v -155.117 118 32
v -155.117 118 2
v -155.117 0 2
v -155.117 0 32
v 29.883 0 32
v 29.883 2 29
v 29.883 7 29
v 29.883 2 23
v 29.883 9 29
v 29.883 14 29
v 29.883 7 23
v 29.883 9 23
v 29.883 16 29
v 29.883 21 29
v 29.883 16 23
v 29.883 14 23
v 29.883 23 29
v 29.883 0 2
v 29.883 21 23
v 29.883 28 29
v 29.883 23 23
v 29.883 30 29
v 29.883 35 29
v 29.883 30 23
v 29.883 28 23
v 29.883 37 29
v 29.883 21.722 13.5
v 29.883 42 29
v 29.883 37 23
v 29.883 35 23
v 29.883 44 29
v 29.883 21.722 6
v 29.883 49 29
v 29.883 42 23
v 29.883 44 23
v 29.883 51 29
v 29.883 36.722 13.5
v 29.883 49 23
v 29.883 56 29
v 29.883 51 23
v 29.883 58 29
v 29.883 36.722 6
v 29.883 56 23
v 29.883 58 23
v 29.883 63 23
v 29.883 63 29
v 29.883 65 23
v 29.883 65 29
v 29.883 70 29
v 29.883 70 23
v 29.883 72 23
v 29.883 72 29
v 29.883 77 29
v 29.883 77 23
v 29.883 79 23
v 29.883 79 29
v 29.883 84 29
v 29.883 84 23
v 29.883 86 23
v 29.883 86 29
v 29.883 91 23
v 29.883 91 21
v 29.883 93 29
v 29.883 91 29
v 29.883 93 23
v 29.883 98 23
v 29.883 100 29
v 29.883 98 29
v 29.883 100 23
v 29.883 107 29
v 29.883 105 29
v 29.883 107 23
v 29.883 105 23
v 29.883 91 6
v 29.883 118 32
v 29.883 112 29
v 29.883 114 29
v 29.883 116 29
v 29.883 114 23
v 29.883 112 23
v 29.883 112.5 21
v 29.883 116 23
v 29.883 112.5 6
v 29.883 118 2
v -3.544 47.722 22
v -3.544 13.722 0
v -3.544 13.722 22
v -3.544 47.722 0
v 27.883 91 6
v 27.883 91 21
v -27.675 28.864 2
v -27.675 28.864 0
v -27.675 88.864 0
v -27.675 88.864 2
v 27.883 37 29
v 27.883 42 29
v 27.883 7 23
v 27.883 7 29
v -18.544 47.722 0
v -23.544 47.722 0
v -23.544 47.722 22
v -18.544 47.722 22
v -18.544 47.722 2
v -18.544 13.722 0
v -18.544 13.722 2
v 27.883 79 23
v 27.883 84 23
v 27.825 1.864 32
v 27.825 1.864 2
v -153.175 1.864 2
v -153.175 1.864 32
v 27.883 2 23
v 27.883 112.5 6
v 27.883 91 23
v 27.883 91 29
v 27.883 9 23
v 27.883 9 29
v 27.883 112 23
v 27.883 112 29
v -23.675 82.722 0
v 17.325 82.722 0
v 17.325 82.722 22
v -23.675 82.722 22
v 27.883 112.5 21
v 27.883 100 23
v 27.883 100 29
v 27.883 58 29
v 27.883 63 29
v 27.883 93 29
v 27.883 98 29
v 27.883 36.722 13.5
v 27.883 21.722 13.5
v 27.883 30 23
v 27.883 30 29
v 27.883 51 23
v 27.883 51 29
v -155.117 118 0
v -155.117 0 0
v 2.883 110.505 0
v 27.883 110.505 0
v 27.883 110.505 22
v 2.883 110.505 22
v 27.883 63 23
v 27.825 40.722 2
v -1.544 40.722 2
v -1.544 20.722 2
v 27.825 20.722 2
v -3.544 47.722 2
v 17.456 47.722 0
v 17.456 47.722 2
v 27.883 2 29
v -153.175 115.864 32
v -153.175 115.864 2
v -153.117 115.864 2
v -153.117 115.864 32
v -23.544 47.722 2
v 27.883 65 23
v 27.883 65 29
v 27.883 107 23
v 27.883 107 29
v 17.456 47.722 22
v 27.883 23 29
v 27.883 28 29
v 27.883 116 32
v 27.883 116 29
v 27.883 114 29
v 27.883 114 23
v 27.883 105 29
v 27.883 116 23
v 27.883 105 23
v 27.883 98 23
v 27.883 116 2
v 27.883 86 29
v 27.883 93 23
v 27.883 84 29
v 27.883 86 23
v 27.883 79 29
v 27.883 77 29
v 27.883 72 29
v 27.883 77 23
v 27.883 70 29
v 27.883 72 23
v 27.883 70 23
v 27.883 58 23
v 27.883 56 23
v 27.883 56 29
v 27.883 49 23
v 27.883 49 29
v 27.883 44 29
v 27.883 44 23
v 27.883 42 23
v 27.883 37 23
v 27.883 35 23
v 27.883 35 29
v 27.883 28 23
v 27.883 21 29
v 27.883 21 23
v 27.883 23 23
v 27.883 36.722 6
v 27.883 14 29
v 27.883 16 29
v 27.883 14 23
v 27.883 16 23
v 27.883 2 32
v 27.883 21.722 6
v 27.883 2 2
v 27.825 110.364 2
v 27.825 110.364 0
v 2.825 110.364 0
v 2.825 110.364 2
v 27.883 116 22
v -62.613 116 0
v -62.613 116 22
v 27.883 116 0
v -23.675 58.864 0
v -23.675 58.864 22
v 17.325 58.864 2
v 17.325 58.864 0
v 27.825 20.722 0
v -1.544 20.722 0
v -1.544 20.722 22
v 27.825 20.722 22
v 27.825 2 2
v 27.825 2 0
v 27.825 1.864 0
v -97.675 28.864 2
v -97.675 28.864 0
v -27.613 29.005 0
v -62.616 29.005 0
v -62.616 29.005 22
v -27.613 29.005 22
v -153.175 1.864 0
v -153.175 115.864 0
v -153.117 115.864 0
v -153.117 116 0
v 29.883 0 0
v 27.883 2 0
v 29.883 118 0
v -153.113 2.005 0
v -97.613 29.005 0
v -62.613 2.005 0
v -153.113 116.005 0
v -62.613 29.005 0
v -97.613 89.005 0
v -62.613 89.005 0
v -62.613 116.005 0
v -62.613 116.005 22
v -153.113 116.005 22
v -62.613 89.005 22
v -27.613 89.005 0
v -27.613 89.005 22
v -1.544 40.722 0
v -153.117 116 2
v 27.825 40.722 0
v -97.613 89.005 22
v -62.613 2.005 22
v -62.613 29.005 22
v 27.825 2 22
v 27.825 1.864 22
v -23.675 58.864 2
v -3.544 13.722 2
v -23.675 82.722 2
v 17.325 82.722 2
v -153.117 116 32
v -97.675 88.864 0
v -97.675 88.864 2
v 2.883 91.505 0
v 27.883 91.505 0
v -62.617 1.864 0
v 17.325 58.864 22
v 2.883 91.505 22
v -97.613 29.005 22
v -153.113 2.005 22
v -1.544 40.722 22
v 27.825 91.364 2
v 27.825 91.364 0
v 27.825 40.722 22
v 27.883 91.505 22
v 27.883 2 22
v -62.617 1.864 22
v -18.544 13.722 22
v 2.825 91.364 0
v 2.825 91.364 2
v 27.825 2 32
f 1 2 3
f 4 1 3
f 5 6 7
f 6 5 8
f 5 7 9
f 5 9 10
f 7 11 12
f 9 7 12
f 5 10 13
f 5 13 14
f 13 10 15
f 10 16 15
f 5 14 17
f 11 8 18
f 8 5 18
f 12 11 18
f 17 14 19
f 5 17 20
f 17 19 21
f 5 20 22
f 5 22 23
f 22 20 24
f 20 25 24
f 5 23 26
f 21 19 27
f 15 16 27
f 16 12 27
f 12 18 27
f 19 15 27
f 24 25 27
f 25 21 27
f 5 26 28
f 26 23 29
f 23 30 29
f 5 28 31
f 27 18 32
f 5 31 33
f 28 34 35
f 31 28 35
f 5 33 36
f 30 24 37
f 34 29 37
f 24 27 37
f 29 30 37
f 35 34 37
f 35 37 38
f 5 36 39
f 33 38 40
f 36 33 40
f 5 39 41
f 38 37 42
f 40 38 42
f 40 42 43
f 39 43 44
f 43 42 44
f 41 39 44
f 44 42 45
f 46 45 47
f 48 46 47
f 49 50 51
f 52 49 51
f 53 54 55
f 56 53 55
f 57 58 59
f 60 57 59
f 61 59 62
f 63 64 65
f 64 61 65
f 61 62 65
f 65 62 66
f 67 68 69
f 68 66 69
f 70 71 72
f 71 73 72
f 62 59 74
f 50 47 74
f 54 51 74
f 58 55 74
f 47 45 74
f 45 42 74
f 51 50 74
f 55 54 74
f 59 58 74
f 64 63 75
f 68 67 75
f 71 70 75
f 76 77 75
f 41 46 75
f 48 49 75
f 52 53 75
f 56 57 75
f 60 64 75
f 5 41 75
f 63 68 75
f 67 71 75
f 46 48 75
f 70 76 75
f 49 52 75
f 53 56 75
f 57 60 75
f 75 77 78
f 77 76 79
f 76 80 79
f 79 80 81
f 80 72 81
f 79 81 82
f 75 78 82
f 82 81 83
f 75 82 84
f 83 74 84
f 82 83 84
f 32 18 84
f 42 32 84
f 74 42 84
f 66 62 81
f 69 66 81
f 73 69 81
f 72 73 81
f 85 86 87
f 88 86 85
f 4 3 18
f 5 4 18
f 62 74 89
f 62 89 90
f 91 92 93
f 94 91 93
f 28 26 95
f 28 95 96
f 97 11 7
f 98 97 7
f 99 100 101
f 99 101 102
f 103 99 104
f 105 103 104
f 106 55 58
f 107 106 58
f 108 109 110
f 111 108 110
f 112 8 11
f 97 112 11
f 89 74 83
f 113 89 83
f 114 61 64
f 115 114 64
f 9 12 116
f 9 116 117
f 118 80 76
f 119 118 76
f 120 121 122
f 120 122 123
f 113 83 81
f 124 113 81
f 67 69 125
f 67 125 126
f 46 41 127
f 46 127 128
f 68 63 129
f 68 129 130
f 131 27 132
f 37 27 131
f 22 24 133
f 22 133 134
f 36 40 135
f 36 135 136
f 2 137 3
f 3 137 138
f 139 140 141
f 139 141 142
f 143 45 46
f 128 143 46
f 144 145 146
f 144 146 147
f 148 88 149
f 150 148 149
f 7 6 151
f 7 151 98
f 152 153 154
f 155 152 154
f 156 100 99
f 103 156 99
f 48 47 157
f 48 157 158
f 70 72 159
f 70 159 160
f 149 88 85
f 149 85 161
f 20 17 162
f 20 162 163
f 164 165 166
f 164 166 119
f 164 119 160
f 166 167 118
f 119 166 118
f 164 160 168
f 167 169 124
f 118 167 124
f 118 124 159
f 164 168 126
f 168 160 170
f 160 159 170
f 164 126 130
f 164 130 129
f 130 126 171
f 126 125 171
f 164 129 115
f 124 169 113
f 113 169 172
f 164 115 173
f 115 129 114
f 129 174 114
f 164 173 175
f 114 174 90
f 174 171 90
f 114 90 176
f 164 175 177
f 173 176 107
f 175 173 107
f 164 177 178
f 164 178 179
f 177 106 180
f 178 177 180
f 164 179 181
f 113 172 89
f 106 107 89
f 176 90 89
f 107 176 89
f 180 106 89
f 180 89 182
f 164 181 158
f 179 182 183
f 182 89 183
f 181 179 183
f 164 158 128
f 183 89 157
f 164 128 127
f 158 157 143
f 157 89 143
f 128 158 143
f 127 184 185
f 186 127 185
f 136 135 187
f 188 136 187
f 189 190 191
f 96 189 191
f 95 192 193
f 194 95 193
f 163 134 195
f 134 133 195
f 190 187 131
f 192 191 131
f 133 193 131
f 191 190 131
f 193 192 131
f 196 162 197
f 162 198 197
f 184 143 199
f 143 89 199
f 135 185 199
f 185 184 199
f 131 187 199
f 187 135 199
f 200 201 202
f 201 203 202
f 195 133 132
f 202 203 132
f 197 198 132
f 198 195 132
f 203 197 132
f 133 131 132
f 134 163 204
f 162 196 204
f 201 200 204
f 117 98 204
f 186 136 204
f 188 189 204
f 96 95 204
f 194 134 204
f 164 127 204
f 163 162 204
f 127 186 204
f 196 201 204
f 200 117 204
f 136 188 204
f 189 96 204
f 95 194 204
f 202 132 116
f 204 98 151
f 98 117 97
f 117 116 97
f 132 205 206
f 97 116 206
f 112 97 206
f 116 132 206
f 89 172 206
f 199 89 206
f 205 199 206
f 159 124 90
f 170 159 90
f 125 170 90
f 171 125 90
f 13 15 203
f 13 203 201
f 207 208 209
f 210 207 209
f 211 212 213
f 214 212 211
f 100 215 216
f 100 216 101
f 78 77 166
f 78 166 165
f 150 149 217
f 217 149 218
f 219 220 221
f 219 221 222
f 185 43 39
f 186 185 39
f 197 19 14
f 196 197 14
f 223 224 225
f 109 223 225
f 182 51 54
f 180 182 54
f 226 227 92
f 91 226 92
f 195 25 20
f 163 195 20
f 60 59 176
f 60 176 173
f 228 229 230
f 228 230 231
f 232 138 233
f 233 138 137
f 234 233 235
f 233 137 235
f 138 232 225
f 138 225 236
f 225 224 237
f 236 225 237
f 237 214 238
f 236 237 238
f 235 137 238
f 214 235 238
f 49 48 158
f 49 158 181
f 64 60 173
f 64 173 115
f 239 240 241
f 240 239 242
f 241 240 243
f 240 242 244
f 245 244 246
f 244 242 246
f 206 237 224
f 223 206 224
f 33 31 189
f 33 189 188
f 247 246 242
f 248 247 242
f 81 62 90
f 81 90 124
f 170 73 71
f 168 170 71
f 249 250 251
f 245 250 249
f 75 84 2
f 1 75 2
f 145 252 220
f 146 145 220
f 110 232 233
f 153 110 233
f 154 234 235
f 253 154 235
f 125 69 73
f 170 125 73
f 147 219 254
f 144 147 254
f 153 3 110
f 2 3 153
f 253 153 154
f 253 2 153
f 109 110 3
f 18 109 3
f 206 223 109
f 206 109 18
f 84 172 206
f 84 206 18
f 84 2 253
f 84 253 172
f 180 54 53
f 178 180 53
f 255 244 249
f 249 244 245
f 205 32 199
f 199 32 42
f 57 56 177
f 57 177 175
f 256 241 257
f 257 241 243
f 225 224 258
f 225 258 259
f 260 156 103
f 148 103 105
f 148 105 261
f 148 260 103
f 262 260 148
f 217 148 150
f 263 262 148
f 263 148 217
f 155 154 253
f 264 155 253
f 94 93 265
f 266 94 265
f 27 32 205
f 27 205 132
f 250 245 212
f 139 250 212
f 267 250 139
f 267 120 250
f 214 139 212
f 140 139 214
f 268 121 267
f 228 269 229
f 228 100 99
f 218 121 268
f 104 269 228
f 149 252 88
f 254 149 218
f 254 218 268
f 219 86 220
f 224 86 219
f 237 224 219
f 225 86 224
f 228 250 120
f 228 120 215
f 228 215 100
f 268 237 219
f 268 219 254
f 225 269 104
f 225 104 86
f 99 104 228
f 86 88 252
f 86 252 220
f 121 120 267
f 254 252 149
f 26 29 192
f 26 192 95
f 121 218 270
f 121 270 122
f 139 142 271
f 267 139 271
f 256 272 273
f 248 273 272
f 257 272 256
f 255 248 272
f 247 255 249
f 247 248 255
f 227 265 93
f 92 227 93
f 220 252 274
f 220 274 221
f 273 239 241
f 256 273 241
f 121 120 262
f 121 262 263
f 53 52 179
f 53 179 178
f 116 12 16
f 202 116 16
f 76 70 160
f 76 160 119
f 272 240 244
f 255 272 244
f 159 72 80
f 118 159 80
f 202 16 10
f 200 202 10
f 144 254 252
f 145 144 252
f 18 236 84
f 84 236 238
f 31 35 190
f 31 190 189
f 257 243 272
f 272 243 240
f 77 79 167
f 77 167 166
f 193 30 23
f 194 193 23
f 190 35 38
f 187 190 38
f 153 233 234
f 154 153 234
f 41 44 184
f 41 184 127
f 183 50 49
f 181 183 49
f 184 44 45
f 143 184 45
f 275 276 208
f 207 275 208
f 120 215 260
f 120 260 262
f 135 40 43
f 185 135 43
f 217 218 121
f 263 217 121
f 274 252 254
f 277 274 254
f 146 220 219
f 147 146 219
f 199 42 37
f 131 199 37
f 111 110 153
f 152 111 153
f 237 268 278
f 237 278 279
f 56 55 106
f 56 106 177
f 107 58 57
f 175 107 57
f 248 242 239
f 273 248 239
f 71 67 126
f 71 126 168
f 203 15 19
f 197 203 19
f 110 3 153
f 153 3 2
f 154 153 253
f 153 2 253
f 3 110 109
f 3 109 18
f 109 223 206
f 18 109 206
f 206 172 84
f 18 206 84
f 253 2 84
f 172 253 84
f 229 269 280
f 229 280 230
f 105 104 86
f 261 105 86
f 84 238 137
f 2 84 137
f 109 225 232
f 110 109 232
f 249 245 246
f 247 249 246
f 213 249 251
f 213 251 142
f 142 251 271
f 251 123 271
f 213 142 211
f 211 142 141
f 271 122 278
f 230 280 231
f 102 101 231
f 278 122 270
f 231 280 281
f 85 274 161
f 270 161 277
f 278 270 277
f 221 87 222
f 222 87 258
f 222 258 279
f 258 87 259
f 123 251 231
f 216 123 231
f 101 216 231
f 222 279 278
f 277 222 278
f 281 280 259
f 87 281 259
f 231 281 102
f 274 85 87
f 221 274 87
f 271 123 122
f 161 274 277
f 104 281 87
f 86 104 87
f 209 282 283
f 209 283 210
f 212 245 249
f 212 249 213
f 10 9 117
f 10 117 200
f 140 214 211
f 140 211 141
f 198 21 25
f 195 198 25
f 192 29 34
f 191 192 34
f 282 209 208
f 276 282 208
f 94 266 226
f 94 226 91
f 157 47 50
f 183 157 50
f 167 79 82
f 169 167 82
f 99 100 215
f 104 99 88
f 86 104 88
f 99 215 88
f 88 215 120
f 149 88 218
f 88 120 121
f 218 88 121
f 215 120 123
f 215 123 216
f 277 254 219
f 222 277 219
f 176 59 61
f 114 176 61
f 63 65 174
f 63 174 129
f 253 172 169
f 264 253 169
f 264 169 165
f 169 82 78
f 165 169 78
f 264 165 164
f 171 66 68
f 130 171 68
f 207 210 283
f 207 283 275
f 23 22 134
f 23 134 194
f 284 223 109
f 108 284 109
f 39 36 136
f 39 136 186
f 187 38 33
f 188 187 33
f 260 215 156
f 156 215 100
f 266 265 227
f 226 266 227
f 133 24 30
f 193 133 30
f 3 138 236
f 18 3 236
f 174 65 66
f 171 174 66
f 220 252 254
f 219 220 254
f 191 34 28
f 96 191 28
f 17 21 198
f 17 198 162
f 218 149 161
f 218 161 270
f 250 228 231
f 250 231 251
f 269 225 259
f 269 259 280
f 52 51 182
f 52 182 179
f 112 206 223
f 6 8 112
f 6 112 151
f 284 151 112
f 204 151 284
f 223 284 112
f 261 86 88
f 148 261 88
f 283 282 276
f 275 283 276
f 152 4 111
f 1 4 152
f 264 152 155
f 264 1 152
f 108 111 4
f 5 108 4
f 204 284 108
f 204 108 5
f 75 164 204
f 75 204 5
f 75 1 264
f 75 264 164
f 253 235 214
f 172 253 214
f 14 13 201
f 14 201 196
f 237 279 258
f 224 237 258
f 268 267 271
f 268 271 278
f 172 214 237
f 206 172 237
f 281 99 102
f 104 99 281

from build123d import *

# Parameters (mm, degrees)
F1_DEPTH = 2
F0_W     = 41
F0_H     = 23.8580039246
F0_W_2   = 35
F0_H_2   = 30
F0_W_3   = 14.5
F0_H_3   = 19
F0_W_4   = 10.5
F3_DEPTH = 22
F4_DEPTH = 30
F5_W     = 29.3693448901
F5_H     = 20
F6_DEPTH = 22
F7_W     = 5
F7_H     = 6
F7_W_2   = 2
F7_W_3   = 15
F7_H_2   = 7.5
F7_W_4   = 21.5
F7_H_3   = 15
F8_DEPTH = 2


with BuildPart() as f1:
    # F0 (on Top) → F1 (new body)
    with BuildSketch(Plane.XY):
        Polygon((29.8828537283, 118), (-155.1171462717, 118), (-155.1171462717, 0), (29.8828537283, 0), (29.8828537283, 47.8673752217), align=None)
        Polygon((27.8828537283, 108.5818558931), (27.8828537283, 47.8439224922), (27.8828537283, 9.4181441069), (27.8828537283, 2), (27.8251939824, 2), (27.8251939824, 1.8636477081), (-62.6748060176, 1.8636477081), (-153.1748060176, 1.8636477081), (-153.1748060176, 58.8636477081), (-153.1748060176, 115.8636477081), (-153.1171462717, 115.8636477081), (-153.1171462717, 116), (27.8828537283, 116), align=None, mode=Mode.SUBTRACT)
    extrude(amount=F1_DEPTH)


with BuildPart() as f1b:
    # F0 (on Top) → F1, piece 2 (new body)
    with BuildSketch(Plane.XY):
        Polygon((27.8251939824, 20.7216516327), (27.8251939824, 40.7216516327), (-1.5441509077, 40.7216516327), (-1.5441509077, 30.7216516327), (-1.5441509077, 20.7216516327), align=None)
    extrude(amount=F1_DEPTH)


with BuildPart() as f1c:
    # F0 (on Top) → F1, piece 3 (new body)
    with BuildSketch(Plane.XY):
        Polygon((-1.5441509077, 47.7216516327), (17.4558490923, 47.7216516327), (17.3251939824, 58.8636477081), (-23.6748060176, 58.8636477081), (-23.5441509077, 47.7216516327), (-18.5441509077, 47.7216516327), (-18.5441509077, 13.7216516327), (-3.5441509077, 13.7216516327), (-3.5441509077, 47.7216516327), align=None)
        with Locations((-3.1748060176, 70.7926496704)):
            Rectangle(F0_W, F0_H)
    extrude(amount=F1_DEPTH)


with BuildPart() as f1d:
    # F0 (on Top) → F1, piece 4 (new body)
    with BuildSketch(Plane.XY):
        with Locations((-45.1748060176, 73.8636477081)):
            Rectangle(F0_W_2, F0_H_2)
        with Locations((-80.1748060176, 73.8636477081)):
            Rectangle(F0_W_2, F0_H_2)
        with Locations((-80.1748060176, 43.8636477081)):
            Rectangle(F0_W_2, F0_H_2)
        with Locations((-45.1748060176, 43.8636477081)):
            Rectangle(F0_W_2, F0_H_2)
    extrude(amount=F1_DEPTH)


with BuildPart() as f1e:
    # F0 (on Top) → F1, piece 5 (new body)
    with BuildSketch(Plane.XY):
        with Locations((10.0751939824, 100.8636477081)):
            Rectangle(F0_W_3, F0_H_3)
        with Locations((22.5751939824, 100.8636477081)):
            Rectangle(F0_W_4, F0_H_3)
    extrude(amount=F1_DEPTH)


with BuildPart() as f3:
    # F2 (on Top) → F3 (new body)
    with BuildSketch(Plane.XY):
        Polygon((-62.6127840281, 116.0047547296), (-153.1127840281, 116.0047547296), (-153.1127840281, 59.0047547296), (-97.6127840281, 59.0047547296), (-97.6127840281, 89.0047547296), (-62.6127840281, 89.0047547296), align=None)
        Polygon((-97.6127840281, 59.0047547296), (-153.1127840281, 59.0047547296), (-153.1127840281, 2.0047547296), (-62.6127840281, 2.0047547296), (-62.6127840281, 29.0047547296), (-97.6127840281, 29.0047547296), align=None)
    extrude(amount=F3_DEPTH)


with BuildPart() as f4:
    # F4 (new): a face of the model
    f4_faces = [f1.part.faces().sort_by_distance(p)[0] for p in [
        (-62.6171462717, 117.7805711961, 2),
    ]]
    extrude(f4_faces, amount=F4_DEPTH)

    # F7 (on face) → F8 (cut)
    with BuildSketch(Plane.YZ.offset(29.8828537283)):
        with Locations((4.5, 26)):
            Rectangle(F7_W, F7_H)
        with Locations((11.5, 26)):
            Rectangle(F7_W, F7_H)
        with Locations((18.5, 26)):
            Rectangle(F7_W, F7_H)
        with Locations((25.5, 26)):
            Rectangle(F7_W, F7_H)
        with Locations((32.5, 26)):
            Rectangle(F7_W, F7_H)
        with Locations((39.5, 26)):
            Rectangle(F7_W, F7_H)
        with Locations((46.5, 26)):
            Rectangle(F7_W, F7_H)
        with Locations((53.5, 26)):
            Rectangle(F7_W, F7_H)
        with Locations((60.5, 26)):
            Rectangle(F7_W, F7_H)
        with Locations((67.5, 26)):
            Rectangle(F7_W, F7_H)
        with Locations((74.5, 26)):
            Rectangle(F7_W, F7_H)
        with Locations((81.5, 26)):
            Rectangle(F7_W, F7_H)
        with Locations((88.5, 26)):
            Rectangle(F7_W, F7_H)
        with Locations((95.5, 26)):
            Rectangle(F7_W, F7_H)
        with Locations((102.5, 26)):
            Rectangle(F7_W, F7_H)
        with Locations((109.5, 26)):
            Rectangle(F7_W, F7_H)
        with Locations((115, 26)):
            Rectangle(F7_W_2, F7_H)
        with Locations((29.22165, 9.75)):
            Rectangle(F7_W_3, F7_H_2)
        with Locations((101.75, 13.5)):
            Rectangle(F7_W_4, F7_H_3)
    extrude(amount=-F8_DEPTH, mode=Mode.SUBTRACT)


with BuildPart() as f6:
    # F5 (on face) → F6 (new body)
    with BuildSketch(Plane(origin=(0, 0, 0), x_dir=(1, 0, 0), z_dir=(0, 0, -1))):
        Polygon((-27.6127840281, -29.0047547296), (-27.6127840281, -59.0047547296), (-23.6748060176, -59.0047547296), (-23.6748060176, -58.8636477081), (-23.5441509077, -47.7216516327), (-18.5441509077, -47.7216516327), (-18.5441509077, -13.7216516327), (-3.5441509077, -13.7216516327), (-3.5441509077, -47.7216516327), (17.4558490923, -47.7216516327), (17.3251939824, -58.8636477081), (17.3251939824, -59.0047547296), (20.3872159719, -59.0047547296), (27.8828537283, -59.0047547296), (27.8828537283, -2), (27.8251939824, -2), (27.8251939824, -1.8636477081), (-62.6171462717, -1.8636477081), (-62.6161089932, -29.0047547296), (-62.6127840281, -29.0047547296), align=None)
        with Locations((13.1405215374, -30.7216516327)):
            Rectangle(F5_W, F5_H, mode=Mode.SUBTRACT)
        Polygon((-27.6127840281, -89.0047547296), (-62.6127840281, -89.0047547296), (-62.6127840281, -116), (27.8828537283, -116), (27.8828537283, -110.5047564595), (2.8828537283, -110.5047564595), (2.8828537283, -91.5047564595), (27.8828537283, -91.5047564595), (27.8828537283, -59.0047547296), (20.3872159719, -59.0047547296), (17.3251939824, -59.0047547296), (17.3251939824, -82.7216516327), (-23.6748060176, -82.7216516327), (-23.6748060176, -59.0047547296), (-27.6127840281, -59.0047547296), align=None)
    extrude(amount=-F6_DEPTH)


solid = Compound([f1.part, f1b.part, f1c.part, f1d.part, f1e.part, f3.part, f4.part, f6.part])
